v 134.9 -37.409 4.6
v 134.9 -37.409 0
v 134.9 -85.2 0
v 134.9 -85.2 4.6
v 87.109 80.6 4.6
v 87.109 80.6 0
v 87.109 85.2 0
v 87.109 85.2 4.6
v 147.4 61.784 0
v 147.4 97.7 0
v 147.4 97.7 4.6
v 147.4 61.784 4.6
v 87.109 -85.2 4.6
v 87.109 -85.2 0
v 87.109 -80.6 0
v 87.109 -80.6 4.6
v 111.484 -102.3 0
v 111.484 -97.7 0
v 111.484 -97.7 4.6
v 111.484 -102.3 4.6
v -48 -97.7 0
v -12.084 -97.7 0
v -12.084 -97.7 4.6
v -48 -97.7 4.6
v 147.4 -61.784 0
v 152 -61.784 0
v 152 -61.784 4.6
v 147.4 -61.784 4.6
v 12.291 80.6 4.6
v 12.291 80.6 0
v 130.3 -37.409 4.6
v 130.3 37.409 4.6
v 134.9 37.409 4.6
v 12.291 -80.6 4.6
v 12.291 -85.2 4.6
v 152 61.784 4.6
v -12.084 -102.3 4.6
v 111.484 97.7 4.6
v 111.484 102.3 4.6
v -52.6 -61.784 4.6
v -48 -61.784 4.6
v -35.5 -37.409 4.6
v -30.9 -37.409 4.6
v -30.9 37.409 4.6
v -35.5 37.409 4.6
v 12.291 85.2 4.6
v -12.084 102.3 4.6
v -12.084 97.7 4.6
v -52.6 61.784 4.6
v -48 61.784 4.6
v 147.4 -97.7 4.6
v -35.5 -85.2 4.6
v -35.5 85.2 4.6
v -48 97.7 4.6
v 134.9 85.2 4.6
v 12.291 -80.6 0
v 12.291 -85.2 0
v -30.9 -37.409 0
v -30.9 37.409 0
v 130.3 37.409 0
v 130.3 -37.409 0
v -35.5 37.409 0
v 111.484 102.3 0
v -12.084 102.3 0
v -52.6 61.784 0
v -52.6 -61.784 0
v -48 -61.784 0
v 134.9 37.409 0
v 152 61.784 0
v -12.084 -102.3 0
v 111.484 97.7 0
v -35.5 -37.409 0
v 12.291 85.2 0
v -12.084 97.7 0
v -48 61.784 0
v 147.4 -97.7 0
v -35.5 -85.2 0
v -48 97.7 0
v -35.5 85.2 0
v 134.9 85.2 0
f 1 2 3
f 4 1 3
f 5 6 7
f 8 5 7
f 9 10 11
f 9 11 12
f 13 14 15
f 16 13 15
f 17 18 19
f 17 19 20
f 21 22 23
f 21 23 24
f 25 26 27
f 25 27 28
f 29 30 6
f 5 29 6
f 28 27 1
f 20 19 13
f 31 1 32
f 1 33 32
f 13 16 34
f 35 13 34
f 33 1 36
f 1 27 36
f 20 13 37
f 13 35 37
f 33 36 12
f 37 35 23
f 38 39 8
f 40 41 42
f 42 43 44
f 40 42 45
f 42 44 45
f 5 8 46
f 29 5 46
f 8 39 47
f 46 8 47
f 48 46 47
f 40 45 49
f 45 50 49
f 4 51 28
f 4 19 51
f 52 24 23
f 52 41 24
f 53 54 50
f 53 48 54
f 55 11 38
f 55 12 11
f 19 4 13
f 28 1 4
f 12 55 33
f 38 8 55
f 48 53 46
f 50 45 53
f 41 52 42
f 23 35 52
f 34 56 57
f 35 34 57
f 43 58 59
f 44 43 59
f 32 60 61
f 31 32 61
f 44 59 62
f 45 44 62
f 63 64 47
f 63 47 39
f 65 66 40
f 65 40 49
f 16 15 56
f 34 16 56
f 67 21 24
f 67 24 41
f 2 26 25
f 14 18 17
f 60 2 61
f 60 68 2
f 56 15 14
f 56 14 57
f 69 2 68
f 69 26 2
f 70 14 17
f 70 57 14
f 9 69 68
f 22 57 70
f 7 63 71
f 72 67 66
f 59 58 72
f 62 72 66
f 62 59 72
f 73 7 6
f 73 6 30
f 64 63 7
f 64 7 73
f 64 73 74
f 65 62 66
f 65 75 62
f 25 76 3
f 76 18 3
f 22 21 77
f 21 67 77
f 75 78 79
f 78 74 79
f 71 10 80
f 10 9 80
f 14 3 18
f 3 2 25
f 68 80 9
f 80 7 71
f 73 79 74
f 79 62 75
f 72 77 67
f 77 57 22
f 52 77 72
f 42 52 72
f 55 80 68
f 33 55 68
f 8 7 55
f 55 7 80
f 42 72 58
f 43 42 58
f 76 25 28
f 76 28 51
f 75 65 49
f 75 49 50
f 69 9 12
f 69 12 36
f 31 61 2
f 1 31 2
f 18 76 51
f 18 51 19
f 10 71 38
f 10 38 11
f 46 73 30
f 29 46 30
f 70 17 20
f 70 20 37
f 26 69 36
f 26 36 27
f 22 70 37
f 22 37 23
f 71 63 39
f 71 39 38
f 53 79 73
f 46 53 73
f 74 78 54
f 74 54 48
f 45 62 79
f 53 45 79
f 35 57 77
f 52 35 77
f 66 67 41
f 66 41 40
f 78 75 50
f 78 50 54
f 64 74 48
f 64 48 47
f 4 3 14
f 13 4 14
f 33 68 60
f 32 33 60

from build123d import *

# Parameters (mm, degrees)
BOSS_EXTRUDE1_DEPTH = 4.6
CUT_EXTRUDE1_DEPTH  = 5.6


with BuildPart() as part:
    # Sketch1 → Boss-Extrude1 (new body)
    with BuildSketch(Plane.XY):
        Polygon((147.4, 61.783577493), (152, 61.783577493), (152, -61.783577493), (147.4, -61.783577493), (147.4, -97.7), (111.483577493, -97.7), (111.483577493, -102.3), (-12.083577493, -102.3), (-12.083577493, -97.7), (-48, -97.7), (-48, -61.783577493), (-52.6, -61.783577493), (-52.6, 61.783577493), (-48, 61.783577493), (-48, 97.7), (-12.083577493, 97.7), (-12.083577493, 102.3), (111.483577493, 102.3), (111.483577493, 97.7), (147.4, 97.7), align=None)
    extrude(amount=BOSS_EXTRUDE1_DEPTH)

    # Sketch2 → Cut-Extrude1 (cut, through all)
    with BuildSketch(Plane(origin=(0, 0, 0), x_dir=(-1, 0, 0), z_dir=(0, 0, -1))):
        Polygon((-134.9, -85.2), (-87.108698535, -85.2), (-87.108698535, -80.6), (-12.291301465, -80.6), (-12.291301465, -85.2), (35.5, -85.2), (35.5, -37.408698535), (30.9, -37.408698535), (30.9, 37.408698535), (35.5, 37.408698535), (35.5, 85.2), (-12.291301465, 85.2), (-12.291301465, 80.6), (-87.108698535, 80.6), (-87.108698535, 85.2), (-134.9, 85.2), (-134.9, 37.408698535), (-130.3, 37.408698535), (-130.3, -37.408698535), (-134.9, -37.408698535), align=None)
    extrude(amount=-CUT_EXTRUDE1_DEPTH, mode=Mode.SUBTRACT)


solid = part.part
